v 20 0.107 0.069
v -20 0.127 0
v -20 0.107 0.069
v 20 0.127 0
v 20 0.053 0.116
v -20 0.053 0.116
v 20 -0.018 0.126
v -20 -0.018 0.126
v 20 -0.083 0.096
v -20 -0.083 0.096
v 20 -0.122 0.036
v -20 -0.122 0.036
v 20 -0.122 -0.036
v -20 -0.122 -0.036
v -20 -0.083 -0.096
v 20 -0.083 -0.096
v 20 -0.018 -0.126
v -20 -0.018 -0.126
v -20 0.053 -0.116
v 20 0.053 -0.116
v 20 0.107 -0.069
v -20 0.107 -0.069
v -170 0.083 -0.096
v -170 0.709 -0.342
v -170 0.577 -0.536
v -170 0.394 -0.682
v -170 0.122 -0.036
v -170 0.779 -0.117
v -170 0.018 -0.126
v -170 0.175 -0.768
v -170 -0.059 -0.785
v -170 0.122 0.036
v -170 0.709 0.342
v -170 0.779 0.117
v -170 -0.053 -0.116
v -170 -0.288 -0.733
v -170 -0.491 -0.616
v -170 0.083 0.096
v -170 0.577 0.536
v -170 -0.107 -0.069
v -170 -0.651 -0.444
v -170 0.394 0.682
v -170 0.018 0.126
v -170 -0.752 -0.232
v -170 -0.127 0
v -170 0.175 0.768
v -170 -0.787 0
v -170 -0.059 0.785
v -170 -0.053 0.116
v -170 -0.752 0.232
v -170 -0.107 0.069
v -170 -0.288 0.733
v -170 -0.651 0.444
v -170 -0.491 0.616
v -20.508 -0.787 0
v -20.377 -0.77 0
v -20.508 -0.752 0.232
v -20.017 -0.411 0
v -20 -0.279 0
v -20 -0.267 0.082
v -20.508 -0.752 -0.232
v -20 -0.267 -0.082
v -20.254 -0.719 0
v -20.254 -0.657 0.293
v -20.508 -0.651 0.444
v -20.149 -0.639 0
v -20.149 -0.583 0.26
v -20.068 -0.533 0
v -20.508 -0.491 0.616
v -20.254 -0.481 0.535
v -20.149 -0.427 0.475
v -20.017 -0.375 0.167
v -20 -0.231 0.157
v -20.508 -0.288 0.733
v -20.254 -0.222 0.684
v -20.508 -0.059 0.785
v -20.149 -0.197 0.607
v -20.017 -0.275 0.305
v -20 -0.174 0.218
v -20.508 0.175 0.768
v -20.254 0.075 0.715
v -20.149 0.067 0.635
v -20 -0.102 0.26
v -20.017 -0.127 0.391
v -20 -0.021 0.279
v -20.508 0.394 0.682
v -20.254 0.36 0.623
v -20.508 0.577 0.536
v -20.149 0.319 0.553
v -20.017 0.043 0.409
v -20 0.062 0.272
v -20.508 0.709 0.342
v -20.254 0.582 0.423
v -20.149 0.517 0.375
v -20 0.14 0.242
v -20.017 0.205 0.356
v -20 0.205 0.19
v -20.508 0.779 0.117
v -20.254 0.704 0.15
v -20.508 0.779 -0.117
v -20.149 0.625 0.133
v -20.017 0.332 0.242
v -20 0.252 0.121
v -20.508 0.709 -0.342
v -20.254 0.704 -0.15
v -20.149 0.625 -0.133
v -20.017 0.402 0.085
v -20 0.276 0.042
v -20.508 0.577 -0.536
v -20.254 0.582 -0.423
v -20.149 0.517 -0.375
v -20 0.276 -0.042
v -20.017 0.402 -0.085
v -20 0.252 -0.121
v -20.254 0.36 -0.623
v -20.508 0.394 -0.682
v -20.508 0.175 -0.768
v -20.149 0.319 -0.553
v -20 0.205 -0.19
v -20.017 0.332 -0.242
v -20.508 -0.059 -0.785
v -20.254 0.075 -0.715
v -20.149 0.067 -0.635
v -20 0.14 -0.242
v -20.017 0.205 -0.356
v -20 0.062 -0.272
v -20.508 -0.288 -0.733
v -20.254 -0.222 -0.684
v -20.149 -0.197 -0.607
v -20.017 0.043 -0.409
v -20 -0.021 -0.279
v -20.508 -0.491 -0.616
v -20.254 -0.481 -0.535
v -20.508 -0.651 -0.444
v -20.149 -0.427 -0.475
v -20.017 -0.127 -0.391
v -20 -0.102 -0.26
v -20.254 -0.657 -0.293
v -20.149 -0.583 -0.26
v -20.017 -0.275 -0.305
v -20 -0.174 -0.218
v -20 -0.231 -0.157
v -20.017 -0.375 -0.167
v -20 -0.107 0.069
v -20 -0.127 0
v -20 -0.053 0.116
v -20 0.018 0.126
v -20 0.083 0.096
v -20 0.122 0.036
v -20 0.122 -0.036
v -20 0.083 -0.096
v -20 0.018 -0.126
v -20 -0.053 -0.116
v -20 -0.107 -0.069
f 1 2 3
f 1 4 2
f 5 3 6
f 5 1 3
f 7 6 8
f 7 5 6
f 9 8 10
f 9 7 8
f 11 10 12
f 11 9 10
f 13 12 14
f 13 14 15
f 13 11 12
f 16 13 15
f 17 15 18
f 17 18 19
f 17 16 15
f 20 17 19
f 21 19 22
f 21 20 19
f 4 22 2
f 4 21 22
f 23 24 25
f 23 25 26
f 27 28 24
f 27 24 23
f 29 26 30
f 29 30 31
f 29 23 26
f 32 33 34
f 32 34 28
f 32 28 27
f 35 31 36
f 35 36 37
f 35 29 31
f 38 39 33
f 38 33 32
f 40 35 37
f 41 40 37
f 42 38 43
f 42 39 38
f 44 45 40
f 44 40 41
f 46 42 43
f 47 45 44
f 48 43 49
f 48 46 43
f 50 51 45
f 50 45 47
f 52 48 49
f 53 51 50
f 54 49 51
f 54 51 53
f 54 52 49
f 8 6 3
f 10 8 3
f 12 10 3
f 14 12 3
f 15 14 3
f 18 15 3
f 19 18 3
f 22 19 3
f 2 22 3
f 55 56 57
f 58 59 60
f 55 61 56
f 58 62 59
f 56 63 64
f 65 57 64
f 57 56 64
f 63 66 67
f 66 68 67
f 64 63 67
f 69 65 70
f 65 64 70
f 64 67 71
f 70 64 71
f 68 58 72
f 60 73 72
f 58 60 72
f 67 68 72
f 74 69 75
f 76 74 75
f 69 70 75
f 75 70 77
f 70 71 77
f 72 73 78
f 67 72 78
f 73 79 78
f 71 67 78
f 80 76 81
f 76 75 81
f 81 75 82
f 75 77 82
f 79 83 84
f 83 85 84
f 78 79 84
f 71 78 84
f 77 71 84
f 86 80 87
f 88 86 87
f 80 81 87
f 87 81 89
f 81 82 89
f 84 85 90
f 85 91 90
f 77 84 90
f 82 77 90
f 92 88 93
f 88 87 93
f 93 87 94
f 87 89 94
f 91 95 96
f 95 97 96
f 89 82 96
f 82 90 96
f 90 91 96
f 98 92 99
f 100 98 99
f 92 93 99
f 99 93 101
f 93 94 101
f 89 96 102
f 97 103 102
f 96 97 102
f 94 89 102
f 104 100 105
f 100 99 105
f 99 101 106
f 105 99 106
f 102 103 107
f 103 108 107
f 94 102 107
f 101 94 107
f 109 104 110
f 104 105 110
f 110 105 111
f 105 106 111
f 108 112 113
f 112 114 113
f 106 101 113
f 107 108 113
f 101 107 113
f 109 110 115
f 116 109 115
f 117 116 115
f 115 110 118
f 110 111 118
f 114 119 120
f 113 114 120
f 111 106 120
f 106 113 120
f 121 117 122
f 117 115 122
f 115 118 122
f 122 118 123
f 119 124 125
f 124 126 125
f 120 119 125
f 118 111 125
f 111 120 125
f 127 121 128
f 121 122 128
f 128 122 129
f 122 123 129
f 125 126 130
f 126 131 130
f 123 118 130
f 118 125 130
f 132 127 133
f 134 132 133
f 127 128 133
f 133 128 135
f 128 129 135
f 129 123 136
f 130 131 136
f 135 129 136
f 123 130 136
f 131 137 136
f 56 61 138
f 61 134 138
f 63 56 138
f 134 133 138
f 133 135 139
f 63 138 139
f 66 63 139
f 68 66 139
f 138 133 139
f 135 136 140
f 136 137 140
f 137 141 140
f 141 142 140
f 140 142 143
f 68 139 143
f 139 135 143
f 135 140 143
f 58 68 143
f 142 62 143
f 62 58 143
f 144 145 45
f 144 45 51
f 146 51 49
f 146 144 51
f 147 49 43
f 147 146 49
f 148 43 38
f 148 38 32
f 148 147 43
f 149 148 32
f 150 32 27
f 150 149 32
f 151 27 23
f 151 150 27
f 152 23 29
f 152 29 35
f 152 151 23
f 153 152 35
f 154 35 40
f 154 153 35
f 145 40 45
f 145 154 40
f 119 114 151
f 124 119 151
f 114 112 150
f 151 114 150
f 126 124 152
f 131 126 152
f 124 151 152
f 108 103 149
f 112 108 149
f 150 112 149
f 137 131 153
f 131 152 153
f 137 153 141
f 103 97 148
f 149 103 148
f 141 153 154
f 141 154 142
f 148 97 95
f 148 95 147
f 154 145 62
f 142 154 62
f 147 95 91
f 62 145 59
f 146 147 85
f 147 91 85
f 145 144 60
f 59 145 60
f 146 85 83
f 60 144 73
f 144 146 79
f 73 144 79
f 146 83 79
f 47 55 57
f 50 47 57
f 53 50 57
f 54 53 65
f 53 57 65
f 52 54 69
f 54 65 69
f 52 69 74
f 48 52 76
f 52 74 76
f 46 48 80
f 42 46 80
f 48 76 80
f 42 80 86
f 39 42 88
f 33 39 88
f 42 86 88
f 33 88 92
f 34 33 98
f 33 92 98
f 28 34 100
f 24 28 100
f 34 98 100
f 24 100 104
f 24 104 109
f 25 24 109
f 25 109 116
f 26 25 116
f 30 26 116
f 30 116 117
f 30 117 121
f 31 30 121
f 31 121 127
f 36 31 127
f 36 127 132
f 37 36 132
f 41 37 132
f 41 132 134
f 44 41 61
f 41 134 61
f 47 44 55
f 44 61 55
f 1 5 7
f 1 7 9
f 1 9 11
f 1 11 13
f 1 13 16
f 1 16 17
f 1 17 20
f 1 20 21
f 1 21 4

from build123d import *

# Parameters (mm, degrees)
F0_R     = 0.127
F1_DEPTH = 20
F2_R     = 0.7874
F2_R_2   = 0.127
F3_DEPTH = 150
F4_R     = 0.508


with BuildPart() as f1:
    # F0 (on Right) → F1 (new body, symmetric)
    with BuildSketch(Plane.YZ):
        Circle(F0_R)
    extrude(amount=F1_DEPTH, both=True)


with BuildPart() as f3:
    # F2 (on face) → F3 (new body)
    with BuildSketch(Plane(origin=(-20, 0, 0), x_dir=(0, -1, 0), z_dir=(-1, 0, 0))):
        Circle(F2_R)
        Circle(F2_R_2, mode=Mode.SUBTRACT)
    extrude(amount=F3_DEPTH)

    # F4
    f4_edges = [f3.edges().sort_by_distance(p)[0] for p in [
        (-20, 0.7874, 0),
    ]]
    fillet(f4_edges, radius=F4_R)


solid = Compound([f1.part, f3.part])
